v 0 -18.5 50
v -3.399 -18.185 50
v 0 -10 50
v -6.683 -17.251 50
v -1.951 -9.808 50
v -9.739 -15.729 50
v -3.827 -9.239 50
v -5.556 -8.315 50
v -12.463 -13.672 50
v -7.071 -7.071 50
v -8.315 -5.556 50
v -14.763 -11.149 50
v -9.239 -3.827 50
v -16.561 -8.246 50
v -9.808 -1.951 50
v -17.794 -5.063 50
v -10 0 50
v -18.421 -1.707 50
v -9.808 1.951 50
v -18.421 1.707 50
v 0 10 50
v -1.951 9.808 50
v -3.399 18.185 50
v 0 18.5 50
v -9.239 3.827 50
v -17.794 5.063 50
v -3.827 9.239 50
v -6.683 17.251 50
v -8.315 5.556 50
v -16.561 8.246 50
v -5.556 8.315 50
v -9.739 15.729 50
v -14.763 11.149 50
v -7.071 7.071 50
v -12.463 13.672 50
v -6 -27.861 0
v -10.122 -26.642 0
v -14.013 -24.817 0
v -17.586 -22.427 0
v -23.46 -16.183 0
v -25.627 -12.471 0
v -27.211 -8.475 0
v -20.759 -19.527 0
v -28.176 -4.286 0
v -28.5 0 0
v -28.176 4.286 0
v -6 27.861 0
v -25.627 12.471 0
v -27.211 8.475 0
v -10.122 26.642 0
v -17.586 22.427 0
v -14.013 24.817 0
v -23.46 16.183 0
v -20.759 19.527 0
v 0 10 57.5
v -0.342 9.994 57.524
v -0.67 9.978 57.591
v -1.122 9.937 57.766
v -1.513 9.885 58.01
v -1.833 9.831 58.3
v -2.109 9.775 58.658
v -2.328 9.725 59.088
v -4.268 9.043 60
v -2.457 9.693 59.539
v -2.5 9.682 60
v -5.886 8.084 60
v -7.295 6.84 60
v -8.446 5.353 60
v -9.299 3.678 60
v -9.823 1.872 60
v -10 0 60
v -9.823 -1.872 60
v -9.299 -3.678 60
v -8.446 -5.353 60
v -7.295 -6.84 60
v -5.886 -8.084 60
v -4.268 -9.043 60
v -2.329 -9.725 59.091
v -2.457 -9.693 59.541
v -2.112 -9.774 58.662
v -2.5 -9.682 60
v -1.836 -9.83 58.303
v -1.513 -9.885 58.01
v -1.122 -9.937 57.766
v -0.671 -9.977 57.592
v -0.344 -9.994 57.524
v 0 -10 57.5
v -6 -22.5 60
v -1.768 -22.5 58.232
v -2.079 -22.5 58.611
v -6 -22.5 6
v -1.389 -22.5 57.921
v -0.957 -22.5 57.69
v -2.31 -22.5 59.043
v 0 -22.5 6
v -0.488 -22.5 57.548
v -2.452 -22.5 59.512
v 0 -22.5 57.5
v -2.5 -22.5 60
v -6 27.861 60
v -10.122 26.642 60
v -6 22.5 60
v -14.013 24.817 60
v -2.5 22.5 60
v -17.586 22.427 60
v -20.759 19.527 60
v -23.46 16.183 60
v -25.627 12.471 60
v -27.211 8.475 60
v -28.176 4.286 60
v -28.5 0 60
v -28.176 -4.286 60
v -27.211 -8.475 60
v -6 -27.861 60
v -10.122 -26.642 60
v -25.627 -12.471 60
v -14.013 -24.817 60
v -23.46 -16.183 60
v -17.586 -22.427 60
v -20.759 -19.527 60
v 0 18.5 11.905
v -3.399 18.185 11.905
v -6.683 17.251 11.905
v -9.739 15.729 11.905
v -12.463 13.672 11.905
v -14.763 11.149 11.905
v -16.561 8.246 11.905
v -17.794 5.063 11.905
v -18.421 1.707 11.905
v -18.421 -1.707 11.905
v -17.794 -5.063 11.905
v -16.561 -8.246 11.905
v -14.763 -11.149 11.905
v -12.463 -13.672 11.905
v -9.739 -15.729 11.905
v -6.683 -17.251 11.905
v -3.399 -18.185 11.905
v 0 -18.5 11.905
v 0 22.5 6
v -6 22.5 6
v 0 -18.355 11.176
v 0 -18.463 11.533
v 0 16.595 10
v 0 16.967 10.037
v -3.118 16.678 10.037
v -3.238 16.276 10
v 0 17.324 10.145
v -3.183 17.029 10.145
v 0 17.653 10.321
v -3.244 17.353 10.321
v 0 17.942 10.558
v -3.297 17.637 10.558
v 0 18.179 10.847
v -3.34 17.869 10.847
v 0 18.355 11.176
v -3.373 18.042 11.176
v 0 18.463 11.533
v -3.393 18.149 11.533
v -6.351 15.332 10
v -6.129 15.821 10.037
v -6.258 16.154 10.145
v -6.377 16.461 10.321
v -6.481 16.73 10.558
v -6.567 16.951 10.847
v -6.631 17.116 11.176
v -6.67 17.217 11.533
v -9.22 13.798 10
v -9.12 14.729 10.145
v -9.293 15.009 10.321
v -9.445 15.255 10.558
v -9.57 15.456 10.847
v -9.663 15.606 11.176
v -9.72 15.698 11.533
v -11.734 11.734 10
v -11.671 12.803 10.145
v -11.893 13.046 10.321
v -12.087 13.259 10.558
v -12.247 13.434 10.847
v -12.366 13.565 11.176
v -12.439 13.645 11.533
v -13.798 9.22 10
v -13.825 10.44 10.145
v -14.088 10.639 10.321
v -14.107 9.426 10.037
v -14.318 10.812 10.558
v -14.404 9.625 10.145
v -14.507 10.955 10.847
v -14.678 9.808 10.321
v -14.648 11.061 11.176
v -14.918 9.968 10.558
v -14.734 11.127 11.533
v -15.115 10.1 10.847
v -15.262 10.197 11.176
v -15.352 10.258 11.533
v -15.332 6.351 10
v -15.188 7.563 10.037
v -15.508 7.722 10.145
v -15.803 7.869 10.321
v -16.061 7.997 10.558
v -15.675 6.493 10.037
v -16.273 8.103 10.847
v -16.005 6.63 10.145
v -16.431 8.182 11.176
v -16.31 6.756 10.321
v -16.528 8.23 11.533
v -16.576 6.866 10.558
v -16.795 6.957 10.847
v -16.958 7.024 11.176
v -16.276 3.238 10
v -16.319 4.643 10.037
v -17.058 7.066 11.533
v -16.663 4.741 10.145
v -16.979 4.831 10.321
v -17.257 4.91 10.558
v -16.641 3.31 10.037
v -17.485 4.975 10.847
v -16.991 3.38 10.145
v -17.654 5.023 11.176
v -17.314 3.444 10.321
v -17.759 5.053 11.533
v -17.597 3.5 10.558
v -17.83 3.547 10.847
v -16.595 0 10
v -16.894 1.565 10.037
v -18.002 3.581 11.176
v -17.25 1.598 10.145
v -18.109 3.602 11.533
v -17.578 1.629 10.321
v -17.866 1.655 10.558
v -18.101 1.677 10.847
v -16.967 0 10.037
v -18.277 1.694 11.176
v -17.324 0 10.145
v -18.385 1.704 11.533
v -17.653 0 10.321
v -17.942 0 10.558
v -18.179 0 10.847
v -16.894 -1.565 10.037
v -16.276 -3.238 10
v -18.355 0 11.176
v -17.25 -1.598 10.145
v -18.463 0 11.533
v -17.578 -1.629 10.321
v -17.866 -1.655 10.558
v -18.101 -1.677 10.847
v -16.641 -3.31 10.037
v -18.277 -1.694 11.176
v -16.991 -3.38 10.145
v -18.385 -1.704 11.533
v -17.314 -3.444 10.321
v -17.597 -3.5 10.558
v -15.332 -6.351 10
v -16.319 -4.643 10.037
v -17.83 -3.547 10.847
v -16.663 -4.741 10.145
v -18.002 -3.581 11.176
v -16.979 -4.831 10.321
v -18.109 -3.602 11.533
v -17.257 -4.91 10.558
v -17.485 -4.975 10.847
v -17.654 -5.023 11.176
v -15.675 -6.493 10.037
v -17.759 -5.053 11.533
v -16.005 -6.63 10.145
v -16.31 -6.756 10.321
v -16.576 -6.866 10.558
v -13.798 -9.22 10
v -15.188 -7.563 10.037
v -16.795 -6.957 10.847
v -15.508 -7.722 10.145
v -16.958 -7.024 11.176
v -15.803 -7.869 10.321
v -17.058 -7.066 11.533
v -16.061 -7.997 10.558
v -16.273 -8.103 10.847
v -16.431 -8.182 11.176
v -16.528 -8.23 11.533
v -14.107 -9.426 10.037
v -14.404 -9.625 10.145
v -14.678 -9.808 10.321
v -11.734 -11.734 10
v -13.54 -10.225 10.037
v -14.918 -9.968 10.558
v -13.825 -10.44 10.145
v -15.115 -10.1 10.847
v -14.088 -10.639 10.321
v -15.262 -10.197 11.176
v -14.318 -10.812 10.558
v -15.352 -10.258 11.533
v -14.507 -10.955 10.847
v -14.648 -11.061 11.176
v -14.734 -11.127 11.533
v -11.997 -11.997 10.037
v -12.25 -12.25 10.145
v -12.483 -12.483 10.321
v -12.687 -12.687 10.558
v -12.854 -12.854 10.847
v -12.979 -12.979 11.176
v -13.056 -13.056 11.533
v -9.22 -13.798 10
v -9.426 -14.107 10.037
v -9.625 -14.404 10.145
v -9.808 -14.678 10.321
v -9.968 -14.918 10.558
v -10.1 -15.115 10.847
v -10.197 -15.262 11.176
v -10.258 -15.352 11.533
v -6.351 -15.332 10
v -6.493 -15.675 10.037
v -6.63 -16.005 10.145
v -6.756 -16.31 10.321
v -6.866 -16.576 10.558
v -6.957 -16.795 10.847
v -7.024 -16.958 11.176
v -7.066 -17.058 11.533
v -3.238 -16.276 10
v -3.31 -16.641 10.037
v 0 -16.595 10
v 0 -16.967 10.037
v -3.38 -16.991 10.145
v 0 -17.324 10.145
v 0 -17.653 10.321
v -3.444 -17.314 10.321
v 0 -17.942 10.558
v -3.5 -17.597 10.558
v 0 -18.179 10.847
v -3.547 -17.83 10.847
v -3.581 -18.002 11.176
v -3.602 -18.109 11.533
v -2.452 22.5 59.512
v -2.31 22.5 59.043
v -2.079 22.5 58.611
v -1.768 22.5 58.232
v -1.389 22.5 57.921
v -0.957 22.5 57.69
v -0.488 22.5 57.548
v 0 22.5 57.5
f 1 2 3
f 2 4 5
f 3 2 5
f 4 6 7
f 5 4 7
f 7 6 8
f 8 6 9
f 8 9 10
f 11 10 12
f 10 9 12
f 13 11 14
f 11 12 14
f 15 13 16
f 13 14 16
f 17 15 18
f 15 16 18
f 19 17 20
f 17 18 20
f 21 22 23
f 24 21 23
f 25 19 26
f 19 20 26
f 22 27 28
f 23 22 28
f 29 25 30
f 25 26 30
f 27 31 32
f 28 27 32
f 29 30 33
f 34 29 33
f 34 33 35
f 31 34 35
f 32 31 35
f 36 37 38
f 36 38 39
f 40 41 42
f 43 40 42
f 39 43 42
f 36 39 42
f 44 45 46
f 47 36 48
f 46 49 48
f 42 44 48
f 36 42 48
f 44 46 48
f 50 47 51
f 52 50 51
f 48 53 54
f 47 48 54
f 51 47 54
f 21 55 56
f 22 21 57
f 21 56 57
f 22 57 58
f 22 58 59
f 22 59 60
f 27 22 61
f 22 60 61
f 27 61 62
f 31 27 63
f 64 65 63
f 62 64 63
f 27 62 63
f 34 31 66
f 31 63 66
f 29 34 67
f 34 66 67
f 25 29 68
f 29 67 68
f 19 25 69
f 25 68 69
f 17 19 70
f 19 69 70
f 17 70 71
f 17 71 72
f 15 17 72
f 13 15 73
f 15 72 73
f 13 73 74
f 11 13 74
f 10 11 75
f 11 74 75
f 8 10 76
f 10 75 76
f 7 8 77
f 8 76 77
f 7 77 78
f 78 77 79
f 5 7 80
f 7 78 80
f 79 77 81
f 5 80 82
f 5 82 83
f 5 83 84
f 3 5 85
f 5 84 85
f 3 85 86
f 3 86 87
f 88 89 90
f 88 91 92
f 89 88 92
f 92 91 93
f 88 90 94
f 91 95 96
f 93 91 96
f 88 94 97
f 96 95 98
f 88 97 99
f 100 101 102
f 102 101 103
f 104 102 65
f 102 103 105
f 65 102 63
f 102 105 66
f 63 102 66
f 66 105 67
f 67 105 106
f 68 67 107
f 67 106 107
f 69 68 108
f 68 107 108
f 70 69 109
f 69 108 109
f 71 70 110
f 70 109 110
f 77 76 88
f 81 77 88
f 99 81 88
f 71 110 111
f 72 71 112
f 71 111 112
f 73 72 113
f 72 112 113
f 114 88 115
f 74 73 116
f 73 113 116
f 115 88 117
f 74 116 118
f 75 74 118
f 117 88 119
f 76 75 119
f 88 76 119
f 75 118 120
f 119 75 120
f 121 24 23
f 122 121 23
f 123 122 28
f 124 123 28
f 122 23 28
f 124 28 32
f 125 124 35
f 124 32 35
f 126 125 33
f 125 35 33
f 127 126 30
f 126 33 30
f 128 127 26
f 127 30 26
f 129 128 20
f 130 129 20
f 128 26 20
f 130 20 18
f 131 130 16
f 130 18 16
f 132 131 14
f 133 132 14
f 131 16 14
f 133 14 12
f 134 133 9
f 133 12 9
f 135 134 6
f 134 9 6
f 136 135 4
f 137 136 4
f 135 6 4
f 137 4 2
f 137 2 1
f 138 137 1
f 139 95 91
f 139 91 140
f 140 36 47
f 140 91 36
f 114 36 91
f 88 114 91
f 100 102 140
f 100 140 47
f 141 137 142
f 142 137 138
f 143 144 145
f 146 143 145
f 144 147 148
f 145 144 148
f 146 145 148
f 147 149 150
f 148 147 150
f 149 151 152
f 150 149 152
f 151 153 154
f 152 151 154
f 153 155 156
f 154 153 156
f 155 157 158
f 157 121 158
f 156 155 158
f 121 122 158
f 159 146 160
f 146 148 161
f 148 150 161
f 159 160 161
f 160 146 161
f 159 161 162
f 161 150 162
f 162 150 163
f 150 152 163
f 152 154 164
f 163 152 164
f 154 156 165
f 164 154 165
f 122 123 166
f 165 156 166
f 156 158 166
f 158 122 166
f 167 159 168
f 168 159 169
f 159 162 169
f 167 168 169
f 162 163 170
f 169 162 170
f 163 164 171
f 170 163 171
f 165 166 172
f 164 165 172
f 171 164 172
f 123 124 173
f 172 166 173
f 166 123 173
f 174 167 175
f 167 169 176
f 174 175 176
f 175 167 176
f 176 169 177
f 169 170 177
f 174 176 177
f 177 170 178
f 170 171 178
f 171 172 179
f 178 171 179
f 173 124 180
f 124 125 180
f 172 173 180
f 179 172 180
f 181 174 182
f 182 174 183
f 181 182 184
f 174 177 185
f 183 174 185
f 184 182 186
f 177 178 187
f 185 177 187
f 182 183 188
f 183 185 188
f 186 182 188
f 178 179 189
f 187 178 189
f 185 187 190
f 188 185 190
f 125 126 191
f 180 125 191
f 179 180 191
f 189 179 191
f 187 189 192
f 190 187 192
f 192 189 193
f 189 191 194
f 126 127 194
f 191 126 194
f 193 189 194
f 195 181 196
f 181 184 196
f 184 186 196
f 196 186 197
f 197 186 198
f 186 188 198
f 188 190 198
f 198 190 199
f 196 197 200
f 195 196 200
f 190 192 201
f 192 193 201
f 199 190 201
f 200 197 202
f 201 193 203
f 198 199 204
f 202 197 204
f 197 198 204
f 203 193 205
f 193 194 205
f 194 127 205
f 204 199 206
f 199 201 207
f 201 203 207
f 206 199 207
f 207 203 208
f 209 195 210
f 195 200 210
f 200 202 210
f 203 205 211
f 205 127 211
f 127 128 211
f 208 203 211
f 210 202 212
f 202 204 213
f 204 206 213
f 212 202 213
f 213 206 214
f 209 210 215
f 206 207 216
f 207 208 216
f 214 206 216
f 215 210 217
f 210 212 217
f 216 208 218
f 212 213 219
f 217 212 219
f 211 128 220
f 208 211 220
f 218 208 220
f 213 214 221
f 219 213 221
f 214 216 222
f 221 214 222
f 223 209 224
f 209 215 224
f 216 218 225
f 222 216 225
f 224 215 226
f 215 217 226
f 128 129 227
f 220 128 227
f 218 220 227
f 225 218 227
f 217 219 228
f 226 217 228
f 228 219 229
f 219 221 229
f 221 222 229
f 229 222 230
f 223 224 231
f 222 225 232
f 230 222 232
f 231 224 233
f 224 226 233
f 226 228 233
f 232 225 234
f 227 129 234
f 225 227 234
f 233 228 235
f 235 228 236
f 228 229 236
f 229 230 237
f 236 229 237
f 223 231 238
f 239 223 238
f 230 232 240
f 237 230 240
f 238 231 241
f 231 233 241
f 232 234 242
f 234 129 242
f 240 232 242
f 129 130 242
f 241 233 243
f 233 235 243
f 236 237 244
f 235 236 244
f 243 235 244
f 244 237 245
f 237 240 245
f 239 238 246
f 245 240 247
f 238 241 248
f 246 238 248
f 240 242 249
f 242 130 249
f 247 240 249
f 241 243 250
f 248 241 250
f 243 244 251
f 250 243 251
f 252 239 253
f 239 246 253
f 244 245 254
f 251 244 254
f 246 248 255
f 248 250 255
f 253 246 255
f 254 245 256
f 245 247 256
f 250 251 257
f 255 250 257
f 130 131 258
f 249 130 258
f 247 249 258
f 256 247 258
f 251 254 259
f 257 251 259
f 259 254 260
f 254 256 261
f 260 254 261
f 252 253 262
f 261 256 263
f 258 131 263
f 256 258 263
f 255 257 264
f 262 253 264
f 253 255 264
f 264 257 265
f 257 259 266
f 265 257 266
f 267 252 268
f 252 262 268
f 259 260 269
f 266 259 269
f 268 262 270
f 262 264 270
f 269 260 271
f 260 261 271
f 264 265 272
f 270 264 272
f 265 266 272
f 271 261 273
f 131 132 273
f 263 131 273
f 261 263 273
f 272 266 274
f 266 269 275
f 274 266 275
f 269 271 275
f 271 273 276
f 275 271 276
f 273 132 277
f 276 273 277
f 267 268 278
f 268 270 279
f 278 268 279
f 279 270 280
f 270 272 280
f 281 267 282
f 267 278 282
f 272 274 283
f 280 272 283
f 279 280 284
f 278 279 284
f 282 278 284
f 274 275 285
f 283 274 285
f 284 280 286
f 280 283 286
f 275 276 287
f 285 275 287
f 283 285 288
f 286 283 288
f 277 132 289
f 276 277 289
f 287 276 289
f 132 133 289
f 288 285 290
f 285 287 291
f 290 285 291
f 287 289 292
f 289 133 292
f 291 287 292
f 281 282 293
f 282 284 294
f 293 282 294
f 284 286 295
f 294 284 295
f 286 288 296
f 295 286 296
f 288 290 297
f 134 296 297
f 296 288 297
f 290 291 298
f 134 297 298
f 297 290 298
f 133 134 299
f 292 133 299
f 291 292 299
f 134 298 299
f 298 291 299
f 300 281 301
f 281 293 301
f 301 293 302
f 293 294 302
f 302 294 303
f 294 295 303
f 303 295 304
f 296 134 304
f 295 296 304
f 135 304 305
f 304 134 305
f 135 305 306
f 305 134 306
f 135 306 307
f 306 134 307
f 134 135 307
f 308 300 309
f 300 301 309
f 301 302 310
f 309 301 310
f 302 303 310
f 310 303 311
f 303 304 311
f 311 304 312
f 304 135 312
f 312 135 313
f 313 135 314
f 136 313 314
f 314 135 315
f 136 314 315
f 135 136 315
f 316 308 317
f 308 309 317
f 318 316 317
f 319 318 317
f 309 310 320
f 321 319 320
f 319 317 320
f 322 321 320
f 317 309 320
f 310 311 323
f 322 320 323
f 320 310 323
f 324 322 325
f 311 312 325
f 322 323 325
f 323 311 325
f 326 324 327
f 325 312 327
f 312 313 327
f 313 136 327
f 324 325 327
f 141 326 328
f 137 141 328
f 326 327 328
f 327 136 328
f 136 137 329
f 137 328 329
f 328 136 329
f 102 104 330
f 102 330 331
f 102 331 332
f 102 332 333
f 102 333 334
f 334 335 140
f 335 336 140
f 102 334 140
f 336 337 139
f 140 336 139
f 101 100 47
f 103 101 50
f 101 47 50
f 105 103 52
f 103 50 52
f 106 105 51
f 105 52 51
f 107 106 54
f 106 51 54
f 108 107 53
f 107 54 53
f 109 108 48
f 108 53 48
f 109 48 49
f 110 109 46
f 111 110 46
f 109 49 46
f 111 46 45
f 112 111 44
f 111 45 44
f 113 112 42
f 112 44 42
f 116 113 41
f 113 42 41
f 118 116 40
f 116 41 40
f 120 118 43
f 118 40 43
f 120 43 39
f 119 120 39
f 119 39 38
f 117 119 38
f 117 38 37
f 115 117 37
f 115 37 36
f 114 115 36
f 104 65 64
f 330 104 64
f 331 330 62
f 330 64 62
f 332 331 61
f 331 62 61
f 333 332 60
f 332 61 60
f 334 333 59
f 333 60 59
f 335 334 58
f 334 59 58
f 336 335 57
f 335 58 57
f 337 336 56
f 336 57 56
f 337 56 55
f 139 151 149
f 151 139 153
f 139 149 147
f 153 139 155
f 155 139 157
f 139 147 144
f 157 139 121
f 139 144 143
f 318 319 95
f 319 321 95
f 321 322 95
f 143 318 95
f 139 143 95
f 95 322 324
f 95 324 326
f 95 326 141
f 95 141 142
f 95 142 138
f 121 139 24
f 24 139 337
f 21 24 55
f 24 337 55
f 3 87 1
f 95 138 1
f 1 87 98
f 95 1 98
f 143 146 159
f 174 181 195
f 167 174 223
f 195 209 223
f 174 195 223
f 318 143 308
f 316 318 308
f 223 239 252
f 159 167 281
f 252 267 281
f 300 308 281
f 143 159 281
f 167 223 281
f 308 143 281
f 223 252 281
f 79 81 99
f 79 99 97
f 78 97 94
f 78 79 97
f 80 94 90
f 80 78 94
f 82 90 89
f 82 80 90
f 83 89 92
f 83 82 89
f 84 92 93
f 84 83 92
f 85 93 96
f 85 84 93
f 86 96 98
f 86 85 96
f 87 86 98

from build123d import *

# Parameters (mm, degrees)
F1_ANGLE_BACK = 90
F1_ANGLE      = 180
F2_R          = 2.5
F3_DEPTH      = 28.501
F3_DEPTH_BACK = 28.501
F4_R          = 1.905
F5_W          = 6
F5_H          = 2.5
F5_W_2        = 45
F5_H_2        = 6
F5_H_3        = 1.5
F6_DEPTH      = 6


with BuildPart() as f1:
    # F0 (on Front) → F1 (revolve)
    with BuildSketch(Plane.XZ, mode=Mode.PRIVATE) as f1_sk:
        Polygon((-18.5, 0), (0, 0), (0, 10), (-18.5, 10), (-18.5, 50), (-10, 50), (-10, 60), (-18.5, 60), (-28.5, 60), (-28.5, 0), align=None)
    revolve(f1_sk.sketch.rotate(Axis((0, 0, 5), (0, 0, 1)), -F1_ANGLE_BACK), axis=Axis((0, 0, 5), (0, 0, 1)), revolution_arc=F1_ANGLE)

    # F2 (on Front) → F3 (cut, two sides)
    with BuildSketch(Plane.XZ) as f3_sk:
        with Locations((0, 60)):
            Circle(F2_R)
    extrude(amount=-F3_DEPTH, mode=Mode.SUBTRACT)
    extrude(f3_sk.sketch, amount=F3_DEPTH_BACK, mode=Mode.SUBTRACT)

    # F4
    f4_edges = [f1.edges().sort_by_distance(p)[0] for p in [
        (-18.5, 0, 10),
    ]]
    fillet(f4_edges, radius=F4_R)

    # F5 (on face) → F6 (cut)
    with BuildSketch(Plane.YZ):
        with Locations((-25.5, 58.75)):
            Rectangle(F5_W, F5_H)
        Polygon((-22.5, 6), (-22.5, 56), (-28.5, 56), (-28.5, 0), (-22.5, 0), align=None)
        with Locations((25.5, 58.75)):
            Rectangle(F5_W, F5_H)
        Polygon((22.5, 56), (22.5, 6), (22.5, 0), (28.5, 0), (28.5, 56), align=None)
        with Locations((0, 3)):
            Rectangle(F5_W_2, F5_H_2)
        with Locations((25.5, 56.75)):
            Rectangle(F5_W, F5_H_3)
        with Locations((-25.5, 56.75)):
            Rectangle(F5_W, F5_H_3)
    extrude(amount=-F6_DEPTH, mode=Mode.SUBTRACT)


solid = f1.part
